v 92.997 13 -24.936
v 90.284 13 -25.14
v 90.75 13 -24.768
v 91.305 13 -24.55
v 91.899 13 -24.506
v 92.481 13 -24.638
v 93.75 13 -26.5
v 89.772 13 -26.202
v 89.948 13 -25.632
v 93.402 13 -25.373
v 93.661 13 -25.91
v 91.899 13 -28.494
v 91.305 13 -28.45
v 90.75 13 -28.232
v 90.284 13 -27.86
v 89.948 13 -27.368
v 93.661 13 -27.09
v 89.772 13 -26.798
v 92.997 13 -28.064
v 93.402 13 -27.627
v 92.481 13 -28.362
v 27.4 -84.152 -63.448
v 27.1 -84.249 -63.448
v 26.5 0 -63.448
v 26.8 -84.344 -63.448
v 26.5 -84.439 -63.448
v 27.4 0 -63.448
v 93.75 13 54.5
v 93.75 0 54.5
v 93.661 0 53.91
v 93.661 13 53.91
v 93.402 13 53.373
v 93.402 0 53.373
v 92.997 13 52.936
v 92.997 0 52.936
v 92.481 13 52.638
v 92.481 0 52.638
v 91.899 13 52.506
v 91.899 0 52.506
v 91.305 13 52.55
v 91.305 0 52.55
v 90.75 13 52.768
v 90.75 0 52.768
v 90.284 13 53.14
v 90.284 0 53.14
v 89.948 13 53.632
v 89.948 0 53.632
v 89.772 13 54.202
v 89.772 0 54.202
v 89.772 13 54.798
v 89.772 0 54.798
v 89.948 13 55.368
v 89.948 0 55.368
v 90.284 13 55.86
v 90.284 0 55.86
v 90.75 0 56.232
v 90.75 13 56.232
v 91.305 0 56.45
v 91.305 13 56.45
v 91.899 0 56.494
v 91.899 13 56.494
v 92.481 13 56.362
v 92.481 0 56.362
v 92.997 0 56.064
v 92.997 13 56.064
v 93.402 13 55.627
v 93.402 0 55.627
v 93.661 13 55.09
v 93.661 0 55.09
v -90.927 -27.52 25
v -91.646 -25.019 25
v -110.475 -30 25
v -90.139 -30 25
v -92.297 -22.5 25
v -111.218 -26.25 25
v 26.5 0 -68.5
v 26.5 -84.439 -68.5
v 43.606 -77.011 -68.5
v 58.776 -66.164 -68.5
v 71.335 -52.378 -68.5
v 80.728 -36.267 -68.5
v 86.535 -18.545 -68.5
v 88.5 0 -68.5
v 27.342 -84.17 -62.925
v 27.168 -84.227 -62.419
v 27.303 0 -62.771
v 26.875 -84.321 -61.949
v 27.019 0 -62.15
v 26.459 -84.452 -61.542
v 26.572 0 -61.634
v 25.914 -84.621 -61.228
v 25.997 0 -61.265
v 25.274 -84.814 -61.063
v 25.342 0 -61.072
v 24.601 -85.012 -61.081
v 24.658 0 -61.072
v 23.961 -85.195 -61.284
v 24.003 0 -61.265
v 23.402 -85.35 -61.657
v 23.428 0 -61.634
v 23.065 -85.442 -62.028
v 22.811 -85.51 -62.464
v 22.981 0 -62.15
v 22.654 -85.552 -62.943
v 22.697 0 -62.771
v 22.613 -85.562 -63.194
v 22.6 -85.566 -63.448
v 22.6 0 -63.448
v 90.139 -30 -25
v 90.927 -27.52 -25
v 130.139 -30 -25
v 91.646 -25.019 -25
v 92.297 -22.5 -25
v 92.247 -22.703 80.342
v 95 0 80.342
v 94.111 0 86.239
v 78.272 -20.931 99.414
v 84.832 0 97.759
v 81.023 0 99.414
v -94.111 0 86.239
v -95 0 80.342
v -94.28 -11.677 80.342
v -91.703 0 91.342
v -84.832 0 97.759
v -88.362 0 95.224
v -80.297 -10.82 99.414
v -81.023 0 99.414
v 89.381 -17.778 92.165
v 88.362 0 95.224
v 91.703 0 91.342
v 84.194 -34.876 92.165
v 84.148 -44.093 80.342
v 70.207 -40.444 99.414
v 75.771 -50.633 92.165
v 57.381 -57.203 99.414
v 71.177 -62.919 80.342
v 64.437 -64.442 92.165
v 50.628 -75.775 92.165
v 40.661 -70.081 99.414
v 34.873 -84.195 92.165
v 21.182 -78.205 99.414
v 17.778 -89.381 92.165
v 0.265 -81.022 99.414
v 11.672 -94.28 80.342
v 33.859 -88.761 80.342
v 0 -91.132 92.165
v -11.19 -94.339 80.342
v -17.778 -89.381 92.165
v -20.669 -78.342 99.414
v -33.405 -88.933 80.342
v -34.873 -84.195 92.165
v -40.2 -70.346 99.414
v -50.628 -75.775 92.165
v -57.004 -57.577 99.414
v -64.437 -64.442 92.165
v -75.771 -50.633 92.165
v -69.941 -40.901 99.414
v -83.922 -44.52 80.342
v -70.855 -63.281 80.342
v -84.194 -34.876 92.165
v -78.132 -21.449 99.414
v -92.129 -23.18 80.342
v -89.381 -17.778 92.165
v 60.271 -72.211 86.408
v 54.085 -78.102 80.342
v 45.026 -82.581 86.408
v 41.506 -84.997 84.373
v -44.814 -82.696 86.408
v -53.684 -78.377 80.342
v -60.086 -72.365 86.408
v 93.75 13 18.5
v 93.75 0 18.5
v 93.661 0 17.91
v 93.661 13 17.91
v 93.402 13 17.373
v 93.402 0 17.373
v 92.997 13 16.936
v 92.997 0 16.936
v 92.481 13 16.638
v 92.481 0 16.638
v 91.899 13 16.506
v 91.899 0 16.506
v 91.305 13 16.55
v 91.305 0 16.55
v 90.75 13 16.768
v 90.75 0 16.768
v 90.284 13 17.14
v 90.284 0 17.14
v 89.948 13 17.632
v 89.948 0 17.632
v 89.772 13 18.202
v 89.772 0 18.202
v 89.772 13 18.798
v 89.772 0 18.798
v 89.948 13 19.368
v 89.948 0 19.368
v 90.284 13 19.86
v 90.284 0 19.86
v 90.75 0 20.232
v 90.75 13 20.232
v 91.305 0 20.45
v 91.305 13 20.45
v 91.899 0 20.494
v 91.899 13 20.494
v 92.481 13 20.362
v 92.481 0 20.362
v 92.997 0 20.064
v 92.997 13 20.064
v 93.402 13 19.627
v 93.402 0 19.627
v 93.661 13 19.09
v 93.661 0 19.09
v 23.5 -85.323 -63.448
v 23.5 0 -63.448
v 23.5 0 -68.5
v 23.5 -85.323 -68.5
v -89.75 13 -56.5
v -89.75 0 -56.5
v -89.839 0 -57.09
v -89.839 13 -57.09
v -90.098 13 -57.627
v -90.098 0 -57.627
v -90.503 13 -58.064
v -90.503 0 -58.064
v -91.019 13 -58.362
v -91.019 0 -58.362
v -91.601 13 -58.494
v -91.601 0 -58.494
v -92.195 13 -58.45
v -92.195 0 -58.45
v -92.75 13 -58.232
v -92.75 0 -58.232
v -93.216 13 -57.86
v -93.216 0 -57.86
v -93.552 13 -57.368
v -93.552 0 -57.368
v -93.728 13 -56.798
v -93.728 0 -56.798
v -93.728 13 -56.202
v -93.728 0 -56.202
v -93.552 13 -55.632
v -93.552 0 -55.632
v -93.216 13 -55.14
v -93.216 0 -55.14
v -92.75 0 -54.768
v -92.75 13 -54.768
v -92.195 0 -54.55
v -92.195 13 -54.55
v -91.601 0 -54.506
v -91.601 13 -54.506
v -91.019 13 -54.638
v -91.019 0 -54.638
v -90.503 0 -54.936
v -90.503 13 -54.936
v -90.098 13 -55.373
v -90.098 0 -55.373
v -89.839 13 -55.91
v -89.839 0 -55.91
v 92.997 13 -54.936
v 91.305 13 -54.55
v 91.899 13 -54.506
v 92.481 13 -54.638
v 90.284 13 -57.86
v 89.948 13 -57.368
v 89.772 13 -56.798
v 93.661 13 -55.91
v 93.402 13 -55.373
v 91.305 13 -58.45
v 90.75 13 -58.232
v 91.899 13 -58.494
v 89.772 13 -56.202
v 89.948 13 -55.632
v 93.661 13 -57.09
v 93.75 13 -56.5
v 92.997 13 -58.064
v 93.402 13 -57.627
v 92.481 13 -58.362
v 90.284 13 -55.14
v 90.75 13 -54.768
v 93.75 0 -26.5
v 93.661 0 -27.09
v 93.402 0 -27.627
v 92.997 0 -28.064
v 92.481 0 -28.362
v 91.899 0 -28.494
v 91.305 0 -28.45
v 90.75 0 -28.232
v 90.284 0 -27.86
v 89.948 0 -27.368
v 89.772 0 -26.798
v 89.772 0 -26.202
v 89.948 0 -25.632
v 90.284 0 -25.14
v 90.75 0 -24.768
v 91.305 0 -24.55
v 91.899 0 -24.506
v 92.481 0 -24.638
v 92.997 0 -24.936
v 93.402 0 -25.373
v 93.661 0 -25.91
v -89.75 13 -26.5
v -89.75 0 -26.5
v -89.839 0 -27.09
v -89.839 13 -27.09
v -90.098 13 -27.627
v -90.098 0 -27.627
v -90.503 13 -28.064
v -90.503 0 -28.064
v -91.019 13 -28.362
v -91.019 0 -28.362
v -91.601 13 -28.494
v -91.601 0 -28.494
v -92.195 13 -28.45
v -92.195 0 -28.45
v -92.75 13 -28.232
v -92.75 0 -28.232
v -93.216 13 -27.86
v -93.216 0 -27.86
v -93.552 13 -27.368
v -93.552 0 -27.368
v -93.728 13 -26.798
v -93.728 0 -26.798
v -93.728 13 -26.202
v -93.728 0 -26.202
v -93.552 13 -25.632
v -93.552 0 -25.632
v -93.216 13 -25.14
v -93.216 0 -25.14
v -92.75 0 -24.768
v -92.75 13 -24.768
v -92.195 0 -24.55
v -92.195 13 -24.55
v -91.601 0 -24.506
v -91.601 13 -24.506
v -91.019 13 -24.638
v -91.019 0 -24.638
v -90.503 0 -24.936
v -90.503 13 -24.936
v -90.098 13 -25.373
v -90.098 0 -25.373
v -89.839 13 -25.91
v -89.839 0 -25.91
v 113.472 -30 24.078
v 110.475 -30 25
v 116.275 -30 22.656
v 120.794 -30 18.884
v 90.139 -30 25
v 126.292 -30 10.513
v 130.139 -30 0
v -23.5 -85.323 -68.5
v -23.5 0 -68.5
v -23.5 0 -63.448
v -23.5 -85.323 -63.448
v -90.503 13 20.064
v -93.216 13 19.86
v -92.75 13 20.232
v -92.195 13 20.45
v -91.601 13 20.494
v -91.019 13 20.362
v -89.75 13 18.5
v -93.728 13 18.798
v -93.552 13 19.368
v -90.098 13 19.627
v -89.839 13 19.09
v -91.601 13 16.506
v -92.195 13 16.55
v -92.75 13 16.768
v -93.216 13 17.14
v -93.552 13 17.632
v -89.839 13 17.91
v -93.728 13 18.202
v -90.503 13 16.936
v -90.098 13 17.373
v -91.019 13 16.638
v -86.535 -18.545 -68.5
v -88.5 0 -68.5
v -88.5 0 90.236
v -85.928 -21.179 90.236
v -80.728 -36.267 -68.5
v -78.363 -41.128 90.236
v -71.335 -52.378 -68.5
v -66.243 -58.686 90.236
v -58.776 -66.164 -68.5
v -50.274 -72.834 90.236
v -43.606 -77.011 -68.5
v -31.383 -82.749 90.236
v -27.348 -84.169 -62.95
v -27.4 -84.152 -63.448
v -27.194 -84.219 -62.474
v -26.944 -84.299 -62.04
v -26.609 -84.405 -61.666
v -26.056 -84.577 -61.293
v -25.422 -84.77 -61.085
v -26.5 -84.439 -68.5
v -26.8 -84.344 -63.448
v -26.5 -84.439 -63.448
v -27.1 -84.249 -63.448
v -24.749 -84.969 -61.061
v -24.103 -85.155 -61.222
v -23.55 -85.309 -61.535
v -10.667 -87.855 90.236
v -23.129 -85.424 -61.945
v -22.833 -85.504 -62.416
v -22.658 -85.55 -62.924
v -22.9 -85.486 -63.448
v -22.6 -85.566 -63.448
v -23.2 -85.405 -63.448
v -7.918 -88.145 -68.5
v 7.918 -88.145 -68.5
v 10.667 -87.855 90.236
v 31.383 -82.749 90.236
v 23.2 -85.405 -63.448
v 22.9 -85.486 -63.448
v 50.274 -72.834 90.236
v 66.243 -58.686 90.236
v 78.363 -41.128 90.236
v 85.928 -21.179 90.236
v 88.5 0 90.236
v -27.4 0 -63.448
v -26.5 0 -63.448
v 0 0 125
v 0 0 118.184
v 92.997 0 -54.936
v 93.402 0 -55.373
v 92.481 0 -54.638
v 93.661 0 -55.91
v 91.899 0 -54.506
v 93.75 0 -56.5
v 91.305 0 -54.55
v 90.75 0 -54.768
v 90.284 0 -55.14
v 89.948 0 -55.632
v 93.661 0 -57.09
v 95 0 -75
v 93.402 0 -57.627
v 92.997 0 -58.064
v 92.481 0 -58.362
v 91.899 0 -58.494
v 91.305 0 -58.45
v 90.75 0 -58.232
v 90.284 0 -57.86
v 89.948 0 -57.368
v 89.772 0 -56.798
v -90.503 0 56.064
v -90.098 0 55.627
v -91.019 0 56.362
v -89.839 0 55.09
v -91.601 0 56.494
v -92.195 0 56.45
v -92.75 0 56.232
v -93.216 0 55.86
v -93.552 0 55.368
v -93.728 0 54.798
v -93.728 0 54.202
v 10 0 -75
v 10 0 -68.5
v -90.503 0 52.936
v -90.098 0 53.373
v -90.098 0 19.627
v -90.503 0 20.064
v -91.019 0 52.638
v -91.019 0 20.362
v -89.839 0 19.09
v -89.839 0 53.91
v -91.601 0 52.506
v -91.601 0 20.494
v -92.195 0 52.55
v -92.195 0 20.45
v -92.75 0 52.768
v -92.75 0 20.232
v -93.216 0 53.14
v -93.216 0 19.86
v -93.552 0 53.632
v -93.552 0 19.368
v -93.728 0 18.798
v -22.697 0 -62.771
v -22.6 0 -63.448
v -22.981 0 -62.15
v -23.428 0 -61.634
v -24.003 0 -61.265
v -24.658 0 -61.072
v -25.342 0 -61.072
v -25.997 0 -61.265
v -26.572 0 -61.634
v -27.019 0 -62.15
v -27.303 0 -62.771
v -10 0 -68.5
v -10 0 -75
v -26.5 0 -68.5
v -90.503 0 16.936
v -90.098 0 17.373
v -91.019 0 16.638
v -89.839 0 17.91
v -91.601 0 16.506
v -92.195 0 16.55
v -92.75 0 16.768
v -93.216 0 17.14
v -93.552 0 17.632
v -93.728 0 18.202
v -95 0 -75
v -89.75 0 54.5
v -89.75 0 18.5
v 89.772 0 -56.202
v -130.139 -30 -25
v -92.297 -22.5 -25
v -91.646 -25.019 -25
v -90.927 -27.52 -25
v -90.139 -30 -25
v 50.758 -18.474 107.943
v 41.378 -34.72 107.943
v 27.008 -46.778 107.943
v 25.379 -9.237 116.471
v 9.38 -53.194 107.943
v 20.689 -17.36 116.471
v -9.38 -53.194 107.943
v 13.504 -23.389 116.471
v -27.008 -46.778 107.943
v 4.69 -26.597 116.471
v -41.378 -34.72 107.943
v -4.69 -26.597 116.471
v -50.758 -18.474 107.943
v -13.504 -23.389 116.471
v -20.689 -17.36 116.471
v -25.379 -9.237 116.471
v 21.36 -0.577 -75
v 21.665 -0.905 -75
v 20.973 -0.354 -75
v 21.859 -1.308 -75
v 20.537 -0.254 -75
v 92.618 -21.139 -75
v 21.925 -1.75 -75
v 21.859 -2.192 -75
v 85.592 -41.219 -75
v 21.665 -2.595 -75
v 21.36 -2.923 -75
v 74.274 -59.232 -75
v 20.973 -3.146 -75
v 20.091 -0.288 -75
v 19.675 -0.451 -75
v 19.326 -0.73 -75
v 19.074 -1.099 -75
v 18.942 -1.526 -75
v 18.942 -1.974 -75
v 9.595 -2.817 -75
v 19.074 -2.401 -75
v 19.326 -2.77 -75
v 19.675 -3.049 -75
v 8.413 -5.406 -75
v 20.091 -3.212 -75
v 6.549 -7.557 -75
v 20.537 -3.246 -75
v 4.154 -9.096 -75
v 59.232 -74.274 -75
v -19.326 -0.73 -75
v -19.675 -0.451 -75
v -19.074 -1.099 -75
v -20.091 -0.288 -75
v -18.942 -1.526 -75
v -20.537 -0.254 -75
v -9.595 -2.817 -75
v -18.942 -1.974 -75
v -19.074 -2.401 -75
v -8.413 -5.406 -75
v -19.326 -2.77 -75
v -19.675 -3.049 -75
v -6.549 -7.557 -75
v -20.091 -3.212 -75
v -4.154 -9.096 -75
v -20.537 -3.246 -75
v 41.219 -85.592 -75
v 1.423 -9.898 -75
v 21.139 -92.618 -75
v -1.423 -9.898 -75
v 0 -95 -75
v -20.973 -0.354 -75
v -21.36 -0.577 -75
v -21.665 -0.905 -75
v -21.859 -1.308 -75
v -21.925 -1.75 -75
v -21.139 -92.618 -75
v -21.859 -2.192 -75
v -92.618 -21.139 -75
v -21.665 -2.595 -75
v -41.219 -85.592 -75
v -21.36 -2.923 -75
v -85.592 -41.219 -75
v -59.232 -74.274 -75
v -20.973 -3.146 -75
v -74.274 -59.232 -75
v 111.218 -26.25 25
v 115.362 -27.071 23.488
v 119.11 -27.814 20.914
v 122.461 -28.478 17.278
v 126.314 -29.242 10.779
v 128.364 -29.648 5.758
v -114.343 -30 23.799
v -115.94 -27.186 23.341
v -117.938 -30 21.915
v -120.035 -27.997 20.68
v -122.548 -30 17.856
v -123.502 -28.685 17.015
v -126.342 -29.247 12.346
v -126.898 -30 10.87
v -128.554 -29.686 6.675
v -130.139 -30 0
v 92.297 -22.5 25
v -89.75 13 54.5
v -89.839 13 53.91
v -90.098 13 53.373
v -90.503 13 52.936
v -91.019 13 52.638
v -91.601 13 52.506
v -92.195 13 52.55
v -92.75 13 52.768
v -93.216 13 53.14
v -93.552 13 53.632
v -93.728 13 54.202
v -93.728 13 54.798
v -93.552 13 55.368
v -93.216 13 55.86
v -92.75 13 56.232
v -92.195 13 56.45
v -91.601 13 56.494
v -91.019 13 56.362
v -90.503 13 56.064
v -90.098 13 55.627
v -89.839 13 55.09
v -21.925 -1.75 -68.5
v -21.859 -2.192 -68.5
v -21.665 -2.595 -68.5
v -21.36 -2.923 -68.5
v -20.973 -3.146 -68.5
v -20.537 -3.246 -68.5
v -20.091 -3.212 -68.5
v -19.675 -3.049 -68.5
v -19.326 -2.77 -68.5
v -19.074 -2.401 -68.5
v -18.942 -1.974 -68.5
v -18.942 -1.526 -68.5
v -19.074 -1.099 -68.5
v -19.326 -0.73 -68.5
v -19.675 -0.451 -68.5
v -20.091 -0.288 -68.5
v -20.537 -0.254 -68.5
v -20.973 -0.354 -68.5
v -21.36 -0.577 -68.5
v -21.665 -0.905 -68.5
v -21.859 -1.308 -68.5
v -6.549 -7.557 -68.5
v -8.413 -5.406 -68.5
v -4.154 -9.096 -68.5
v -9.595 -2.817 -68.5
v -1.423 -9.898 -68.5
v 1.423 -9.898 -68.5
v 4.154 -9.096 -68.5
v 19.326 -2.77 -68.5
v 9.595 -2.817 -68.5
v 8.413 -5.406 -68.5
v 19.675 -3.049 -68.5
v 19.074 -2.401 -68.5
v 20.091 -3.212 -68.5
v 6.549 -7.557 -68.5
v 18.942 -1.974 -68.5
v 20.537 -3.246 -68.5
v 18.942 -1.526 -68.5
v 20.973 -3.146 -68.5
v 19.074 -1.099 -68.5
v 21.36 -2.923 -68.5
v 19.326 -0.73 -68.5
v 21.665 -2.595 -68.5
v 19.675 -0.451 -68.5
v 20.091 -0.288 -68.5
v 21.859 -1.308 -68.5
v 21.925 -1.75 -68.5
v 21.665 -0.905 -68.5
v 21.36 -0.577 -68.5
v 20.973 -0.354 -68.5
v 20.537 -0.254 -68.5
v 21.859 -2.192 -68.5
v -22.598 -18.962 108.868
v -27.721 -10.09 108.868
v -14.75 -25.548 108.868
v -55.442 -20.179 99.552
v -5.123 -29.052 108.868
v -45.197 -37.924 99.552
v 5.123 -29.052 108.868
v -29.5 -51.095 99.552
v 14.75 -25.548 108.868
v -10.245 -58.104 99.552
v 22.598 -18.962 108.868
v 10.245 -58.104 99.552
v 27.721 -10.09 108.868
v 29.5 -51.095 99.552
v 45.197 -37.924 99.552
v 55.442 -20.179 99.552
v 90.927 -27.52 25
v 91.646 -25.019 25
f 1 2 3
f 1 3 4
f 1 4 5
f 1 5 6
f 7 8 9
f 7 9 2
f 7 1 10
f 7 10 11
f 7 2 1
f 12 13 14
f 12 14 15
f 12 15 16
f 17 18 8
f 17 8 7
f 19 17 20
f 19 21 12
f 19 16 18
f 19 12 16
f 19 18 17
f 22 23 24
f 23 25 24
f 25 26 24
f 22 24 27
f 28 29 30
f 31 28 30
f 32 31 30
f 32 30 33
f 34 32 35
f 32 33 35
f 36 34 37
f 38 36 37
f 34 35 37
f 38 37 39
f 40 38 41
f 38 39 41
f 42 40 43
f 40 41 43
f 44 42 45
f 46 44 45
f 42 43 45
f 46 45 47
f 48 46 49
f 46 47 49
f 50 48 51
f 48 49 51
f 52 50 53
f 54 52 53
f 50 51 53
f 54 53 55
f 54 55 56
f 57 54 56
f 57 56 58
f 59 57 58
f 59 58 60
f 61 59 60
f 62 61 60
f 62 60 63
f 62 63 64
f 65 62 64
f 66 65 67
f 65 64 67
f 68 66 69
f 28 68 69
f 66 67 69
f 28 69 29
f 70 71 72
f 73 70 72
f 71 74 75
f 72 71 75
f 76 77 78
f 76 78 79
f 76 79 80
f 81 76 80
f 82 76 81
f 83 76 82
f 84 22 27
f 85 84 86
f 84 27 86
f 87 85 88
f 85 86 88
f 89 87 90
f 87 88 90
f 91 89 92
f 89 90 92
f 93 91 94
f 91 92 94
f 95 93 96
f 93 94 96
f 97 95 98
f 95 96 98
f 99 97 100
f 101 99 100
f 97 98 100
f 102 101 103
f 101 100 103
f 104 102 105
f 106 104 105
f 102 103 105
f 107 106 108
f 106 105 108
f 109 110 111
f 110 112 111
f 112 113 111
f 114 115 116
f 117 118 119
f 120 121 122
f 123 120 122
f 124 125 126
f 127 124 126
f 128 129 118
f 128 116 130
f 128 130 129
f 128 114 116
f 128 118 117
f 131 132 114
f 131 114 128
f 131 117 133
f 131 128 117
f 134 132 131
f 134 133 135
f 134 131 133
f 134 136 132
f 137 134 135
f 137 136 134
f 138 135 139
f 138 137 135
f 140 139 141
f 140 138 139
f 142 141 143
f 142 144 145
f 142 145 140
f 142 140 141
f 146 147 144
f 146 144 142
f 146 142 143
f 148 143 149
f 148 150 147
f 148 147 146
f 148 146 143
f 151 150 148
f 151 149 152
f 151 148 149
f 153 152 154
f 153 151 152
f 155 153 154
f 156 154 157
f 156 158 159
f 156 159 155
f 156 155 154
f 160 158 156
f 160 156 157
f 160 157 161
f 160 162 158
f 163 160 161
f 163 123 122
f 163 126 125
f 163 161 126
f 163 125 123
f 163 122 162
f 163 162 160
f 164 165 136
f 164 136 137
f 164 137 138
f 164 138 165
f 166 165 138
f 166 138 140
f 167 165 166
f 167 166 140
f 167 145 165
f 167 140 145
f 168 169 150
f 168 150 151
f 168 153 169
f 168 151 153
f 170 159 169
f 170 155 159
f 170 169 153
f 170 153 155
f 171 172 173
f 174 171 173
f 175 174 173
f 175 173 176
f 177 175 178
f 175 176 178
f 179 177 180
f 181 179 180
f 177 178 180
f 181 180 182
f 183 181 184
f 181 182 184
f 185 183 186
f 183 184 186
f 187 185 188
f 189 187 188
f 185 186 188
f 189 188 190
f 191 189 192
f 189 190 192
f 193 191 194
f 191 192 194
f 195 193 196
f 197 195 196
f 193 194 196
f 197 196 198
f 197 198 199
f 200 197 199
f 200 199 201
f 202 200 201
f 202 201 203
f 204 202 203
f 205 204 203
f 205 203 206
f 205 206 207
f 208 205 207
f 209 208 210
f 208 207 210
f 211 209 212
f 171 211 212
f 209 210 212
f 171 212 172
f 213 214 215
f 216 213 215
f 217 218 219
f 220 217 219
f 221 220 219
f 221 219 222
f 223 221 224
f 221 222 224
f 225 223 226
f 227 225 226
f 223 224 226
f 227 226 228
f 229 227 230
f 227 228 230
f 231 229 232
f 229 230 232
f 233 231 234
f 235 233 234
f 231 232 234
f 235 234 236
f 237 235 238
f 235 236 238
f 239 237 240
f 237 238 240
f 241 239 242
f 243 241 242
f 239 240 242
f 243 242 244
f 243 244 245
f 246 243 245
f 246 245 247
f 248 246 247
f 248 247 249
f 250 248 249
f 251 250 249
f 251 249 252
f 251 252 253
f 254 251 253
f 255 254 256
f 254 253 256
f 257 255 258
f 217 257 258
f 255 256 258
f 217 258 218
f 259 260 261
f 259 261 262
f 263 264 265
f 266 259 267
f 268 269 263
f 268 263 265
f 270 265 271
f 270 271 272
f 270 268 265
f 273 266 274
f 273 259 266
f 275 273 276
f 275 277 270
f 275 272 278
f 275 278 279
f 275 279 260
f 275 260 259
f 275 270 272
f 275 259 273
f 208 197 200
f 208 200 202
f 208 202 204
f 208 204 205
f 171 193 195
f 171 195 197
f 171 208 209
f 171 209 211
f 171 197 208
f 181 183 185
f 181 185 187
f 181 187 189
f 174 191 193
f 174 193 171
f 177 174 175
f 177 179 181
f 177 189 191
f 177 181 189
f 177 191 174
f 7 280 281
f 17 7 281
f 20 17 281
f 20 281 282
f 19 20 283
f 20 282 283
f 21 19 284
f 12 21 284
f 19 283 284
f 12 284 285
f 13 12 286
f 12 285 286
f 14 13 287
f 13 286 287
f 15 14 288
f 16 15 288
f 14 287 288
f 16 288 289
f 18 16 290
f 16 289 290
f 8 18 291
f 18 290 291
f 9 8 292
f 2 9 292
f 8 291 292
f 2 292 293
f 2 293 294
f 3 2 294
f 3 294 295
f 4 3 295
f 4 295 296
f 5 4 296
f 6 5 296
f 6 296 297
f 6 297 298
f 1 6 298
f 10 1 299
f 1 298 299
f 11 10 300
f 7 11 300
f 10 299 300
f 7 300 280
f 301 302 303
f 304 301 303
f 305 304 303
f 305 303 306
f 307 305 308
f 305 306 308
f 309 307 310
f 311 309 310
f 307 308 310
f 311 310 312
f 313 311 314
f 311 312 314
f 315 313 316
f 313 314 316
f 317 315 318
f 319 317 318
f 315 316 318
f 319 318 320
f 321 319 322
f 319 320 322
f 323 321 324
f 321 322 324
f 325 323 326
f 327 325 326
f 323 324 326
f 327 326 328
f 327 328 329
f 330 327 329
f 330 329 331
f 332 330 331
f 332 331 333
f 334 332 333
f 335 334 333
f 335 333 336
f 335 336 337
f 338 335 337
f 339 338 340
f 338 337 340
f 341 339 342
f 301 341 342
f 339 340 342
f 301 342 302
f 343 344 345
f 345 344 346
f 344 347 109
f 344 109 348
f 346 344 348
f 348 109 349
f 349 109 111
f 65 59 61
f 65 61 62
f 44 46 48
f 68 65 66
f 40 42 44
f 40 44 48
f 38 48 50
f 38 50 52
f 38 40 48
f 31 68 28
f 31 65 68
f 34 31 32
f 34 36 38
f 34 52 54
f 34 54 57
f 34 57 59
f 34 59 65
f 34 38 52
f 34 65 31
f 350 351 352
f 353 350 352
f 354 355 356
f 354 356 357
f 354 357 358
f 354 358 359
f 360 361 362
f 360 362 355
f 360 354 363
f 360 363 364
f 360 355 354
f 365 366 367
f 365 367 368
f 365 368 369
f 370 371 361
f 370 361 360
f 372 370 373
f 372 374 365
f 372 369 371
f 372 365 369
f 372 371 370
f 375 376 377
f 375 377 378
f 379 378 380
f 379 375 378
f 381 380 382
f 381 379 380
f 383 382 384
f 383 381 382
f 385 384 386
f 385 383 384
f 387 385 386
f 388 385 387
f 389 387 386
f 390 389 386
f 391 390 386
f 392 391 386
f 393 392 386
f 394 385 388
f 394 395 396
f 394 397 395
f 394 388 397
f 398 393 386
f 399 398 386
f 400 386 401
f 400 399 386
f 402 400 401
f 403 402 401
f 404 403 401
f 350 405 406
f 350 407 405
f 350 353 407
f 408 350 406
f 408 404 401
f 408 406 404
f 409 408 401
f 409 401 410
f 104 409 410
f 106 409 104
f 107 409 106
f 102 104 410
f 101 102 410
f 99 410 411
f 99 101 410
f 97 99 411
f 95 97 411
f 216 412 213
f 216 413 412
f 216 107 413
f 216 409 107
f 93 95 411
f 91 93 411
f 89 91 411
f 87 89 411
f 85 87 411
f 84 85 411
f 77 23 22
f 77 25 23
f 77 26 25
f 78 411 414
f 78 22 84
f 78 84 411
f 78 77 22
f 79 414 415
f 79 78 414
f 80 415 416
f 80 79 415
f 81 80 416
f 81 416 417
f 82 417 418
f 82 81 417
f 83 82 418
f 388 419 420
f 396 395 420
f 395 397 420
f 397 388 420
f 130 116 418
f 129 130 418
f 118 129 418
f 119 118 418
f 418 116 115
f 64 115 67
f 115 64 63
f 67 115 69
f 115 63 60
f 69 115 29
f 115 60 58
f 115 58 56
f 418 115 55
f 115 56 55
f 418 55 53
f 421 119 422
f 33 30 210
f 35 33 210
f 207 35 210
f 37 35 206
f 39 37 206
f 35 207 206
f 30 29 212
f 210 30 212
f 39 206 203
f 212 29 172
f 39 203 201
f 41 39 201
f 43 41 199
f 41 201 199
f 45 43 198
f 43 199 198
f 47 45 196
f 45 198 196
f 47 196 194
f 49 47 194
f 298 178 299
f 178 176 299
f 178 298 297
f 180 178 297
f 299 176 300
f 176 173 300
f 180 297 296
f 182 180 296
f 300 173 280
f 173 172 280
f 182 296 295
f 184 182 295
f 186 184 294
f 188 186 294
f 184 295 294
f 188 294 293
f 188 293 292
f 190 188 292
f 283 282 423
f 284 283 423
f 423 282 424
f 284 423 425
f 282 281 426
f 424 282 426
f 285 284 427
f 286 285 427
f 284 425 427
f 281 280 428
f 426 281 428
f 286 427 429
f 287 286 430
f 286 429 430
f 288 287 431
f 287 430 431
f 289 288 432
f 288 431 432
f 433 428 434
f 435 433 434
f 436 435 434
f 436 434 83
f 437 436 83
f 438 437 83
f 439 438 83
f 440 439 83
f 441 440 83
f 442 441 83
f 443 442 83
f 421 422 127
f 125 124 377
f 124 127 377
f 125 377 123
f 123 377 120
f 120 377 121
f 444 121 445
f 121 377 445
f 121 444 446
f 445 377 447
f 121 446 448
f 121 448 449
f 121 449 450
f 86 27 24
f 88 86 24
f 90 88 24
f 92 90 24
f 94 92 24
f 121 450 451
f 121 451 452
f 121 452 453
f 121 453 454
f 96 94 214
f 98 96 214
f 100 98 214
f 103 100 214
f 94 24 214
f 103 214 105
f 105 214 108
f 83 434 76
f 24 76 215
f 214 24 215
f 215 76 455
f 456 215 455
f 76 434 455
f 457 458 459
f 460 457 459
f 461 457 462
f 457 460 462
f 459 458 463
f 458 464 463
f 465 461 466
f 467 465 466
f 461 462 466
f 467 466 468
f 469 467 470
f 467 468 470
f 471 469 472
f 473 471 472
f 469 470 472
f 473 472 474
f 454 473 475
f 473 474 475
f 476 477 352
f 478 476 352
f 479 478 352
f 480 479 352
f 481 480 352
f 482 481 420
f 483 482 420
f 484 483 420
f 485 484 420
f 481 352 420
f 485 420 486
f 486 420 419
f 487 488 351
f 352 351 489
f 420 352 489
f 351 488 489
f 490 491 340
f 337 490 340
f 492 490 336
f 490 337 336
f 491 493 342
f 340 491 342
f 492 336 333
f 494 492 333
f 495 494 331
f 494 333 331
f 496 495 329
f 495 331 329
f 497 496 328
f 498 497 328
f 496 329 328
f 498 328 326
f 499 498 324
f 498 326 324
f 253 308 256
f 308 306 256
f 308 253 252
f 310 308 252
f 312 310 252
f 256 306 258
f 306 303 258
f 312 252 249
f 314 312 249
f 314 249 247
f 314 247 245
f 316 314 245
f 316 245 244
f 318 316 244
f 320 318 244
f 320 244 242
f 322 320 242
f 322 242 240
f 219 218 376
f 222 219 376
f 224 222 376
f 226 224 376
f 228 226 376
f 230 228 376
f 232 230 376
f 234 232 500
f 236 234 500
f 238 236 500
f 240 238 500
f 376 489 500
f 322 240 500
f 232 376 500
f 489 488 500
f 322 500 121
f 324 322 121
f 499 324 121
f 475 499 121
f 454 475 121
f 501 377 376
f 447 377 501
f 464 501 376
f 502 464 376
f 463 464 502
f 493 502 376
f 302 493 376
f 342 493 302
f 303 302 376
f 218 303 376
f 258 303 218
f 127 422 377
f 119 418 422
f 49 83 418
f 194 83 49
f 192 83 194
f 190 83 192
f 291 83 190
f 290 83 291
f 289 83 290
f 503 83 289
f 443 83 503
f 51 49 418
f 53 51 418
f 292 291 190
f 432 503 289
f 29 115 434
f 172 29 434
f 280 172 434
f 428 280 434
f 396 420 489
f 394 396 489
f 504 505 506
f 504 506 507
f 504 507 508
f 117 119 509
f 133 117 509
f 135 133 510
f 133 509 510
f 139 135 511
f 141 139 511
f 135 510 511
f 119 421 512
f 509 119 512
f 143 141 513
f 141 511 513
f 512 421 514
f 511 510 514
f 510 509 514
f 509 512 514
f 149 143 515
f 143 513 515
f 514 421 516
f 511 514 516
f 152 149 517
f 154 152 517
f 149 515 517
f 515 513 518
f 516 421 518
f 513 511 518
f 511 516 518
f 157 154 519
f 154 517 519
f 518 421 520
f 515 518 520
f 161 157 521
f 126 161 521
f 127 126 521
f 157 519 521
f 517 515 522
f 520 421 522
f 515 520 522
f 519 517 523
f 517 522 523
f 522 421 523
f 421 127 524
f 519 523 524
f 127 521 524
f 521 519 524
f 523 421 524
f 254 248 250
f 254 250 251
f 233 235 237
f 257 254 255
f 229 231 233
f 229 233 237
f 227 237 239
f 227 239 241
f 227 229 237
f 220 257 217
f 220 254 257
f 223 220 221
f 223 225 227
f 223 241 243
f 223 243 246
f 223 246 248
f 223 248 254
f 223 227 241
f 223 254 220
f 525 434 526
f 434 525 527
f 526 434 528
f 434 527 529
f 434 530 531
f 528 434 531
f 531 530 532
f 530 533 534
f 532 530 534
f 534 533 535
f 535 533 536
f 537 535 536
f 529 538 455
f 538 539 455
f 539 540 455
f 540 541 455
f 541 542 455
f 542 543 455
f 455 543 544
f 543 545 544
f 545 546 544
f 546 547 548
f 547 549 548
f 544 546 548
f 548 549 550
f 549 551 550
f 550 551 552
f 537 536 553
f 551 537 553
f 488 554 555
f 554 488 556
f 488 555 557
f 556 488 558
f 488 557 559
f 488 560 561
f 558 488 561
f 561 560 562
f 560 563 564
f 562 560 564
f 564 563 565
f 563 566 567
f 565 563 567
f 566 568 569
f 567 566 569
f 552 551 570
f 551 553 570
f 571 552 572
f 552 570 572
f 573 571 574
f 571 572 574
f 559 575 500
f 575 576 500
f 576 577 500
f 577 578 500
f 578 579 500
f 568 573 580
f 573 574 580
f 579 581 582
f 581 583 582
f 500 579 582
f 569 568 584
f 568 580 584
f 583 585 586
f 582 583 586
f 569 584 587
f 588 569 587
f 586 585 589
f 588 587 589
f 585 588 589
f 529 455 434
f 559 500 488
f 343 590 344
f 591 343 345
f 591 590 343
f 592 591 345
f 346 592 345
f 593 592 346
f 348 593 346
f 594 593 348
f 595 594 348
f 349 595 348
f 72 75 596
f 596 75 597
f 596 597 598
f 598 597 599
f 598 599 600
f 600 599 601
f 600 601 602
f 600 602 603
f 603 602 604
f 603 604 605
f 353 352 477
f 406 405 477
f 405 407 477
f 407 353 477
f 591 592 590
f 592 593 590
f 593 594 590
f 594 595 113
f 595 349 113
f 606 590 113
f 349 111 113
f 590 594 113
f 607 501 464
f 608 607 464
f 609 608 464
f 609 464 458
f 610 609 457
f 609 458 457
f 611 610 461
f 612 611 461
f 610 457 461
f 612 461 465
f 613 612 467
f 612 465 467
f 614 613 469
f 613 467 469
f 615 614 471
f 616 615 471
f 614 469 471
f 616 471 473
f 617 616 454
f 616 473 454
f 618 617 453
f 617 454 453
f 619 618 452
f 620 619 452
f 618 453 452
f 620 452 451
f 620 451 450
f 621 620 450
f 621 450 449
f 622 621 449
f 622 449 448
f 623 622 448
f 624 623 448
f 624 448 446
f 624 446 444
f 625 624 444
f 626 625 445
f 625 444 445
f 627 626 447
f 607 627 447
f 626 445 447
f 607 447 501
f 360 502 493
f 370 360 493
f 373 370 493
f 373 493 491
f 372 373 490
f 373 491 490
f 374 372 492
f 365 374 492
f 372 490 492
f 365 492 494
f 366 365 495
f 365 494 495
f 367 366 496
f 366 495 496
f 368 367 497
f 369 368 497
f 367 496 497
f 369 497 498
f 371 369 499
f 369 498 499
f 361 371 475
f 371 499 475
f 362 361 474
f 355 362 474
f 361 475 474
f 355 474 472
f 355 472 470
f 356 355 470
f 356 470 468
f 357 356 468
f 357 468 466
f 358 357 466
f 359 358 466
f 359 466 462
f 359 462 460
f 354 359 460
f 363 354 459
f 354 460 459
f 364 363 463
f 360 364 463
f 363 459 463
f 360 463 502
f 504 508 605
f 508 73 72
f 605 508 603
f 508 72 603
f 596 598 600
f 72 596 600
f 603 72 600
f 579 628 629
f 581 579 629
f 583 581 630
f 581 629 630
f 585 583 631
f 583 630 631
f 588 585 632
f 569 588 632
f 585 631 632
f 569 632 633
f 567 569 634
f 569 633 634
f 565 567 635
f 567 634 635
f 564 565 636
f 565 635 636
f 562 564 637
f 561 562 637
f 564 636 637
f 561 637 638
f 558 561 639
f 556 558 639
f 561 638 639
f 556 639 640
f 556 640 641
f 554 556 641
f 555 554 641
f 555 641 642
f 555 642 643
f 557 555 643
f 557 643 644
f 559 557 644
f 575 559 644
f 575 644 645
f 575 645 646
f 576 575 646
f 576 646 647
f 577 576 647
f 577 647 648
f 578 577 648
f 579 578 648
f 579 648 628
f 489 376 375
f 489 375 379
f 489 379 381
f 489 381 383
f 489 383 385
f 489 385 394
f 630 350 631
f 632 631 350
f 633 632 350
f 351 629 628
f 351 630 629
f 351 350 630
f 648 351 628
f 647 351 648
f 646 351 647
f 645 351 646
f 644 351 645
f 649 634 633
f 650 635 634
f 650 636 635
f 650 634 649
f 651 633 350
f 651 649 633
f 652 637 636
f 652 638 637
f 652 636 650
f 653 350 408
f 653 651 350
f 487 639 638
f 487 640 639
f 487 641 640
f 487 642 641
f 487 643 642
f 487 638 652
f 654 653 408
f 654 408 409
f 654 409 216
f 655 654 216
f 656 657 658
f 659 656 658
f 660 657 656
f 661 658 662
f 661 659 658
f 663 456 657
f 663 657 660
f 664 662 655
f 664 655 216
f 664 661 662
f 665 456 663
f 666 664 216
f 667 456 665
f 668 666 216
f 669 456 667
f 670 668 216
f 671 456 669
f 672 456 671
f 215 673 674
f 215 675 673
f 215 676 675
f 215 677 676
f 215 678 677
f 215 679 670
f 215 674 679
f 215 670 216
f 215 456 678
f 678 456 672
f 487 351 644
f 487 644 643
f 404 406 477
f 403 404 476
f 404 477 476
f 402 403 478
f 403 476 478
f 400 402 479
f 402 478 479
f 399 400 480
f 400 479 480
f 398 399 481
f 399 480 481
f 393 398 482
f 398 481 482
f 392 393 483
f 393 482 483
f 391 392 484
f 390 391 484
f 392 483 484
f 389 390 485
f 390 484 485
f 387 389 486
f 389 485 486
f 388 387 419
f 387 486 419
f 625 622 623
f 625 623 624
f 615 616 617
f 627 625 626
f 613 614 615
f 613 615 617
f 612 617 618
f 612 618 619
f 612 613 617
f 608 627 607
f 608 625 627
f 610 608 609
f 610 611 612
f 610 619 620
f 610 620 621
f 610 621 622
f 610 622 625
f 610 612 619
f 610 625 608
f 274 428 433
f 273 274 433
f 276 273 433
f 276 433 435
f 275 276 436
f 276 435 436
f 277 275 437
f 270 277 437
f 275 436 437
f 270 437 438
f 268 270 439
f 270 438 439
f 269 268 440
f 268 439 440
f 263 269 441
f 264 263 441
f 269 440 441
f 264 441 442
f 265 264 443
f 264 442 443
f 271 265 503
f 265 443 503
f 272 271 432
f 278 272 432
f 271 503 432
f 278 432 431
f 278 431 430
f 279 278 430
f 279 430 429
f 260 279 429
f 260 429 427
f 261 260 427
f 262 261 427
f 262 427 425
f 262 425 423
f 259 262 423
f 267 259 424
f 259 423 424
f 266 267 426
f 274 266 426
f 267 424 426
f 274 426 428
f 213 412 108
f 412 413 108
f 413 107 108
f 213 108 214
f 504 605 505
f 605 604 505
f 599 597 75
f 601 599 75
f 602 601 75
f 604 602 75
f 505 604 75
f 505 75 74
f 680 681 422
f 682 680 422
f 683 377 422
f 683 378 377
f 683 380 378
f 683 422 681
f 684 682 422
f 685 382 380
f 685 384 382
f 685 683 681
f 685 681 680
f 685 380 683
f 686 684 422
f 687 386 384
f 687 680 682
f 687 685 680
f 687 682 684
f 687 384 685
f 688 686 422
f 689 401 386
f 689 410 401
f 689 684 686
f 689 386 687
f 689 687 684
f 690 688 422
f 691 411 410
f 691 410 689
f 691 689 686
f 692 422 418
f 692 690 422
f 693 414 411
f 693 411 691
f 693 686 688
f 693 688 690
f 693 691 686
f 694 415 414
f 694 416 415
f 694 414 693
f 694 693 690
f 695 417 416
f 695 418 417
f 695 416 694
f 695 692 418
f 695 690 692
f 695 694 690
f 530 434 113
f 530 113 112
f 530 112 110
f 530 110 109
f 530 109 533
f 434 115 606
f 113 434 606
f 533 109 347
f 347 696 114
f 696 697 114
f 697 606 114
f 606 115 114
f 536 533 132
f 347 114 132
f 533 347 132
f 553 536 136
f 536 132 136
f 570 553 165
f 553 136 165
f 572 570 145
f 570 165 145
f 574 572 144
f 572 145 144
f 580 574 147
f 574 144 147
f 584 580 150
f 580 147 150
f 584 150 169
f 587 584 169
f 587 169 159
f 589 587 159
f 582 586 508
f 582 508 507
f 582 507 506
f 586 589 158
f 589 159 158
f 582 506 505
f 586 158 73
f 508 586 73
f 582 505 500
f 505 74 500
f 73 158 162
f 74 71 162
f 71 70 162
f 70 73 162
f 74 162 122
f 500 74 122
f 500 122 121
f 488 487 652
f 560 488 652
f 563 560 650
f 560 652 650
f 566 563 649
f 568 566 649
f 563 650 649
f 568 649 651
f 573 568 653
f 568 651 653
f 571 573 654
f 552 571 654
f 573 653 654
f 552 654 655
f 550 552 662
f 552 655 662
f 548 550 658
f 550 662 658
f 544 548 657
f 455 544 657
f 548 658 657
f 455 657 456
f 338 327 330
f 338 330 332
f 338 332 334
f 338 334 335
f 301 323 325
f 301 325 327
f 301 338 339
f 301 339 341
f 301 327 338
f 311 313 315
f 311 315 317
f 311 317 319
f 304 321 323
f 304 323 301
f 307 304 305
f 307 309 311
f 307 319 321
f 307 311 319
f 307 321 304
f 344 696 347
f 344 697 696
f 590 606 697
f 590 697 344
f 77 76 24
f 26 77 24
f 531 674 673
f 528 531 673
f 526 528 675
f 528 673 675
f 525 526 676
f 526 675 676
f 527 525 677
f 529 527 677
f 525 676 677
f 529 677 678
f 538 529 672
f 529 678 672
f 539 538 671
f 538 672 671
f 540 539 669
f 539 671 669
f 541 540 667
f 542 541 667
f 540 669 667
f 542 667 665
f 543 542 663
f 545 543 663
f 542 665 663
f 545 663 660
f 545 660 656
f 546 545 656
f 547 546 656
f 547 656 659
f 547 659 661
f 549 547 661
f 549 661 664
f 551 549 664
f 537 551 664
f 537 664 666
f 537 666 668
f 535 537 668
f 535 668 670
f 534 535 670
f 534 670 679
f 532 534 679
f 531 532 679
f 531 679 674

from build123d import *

# Parameters (mm, degrees)
REVOLVE1_ANGLE           = 180
SKETCH3_R                = 2
BOSS_EXTRUDE1_DEPTH      = 13
BOSS_EXTRUDE8_REACH      = 185.507
BOSS_EXTRUDE8_END_RADIUS = 88.5
SKETCH7_R                = 10
SKETCH7_R_2              = 1.5
CUT_EXTRUDE1_DEPTH       = 10
BOSS_EXTRUDE11_DEPTH     = 25
FILLET1_R                = 20
CUT_EXTRUDE2_DEPTH       = 10
CUT_EXTRUDE3_DEPTH       = 10


with BuildPart() as part:
    # Sketch1 → Revolve1 (revolve)
    with BuildSketch(Plane(origin=(0, 0, 0), x_dir=(1, 0, 0), z_dir=(0, 1, 0))):
        Polygon((0, 75), (95, 75), (95, -95), (0, -125), align=None)
    revolve(axis=Axis((0, 0, 125), (0, 0, -1)), revolution_arc=REVOLVE1_ANGLE)

    # Sketch2 → Cut-Revolve3 (revolve, cut)
    with BuildSketch(Plane(origin=(0, 0, 0), x_dir=(1, 0, 0), z_dir=(0, 1, 0))):
        Polygon((0, 68.5), (0, -118.183600921), (88.5, -90.2362325), (88.5, 68.5), align=None)
    revolve(axis=Axis((0, 0, -68.5), (0, 0, 1)), mode=Mode.SUBTRACT)

    # Sketch3 → Boss-Extrude1 (add)
    with BuildSketch(Plane(origin=(0, 0, 0), x_dir=(1, 0, 0), z_dir=(0, 1, 0))):
        with Locations((-91.75, 56.5)):
            Circle(SKETCH3_R)
        with Locations((-91.75, 26.5)):
            Circle(SKETCH3_R)
        with Locations((-91.75, -18.5)):
            Circle(SKETCH3_R)
        with Locations((-91.75, -54.5)):
            Circle(SKETCH3_R)
        with Locations((91.75, -54.5)):
            Circle(SKETCH3_R)
        with Locations((91.75, -18.5)):
            Circle(SKETCH3_R)
        with Locations((91.75, 26.5)):
            Circle(SKETCH3_R)
        with Locations((91.75, 56.5)):
            Circle(SKETCH3_R)
    extrude(amount=BOSS_EXTRUDE1_DEPTH)

    # Boss-Extrude8: up to this cylinder (the profile starts inside it)
    boss_extrude8_end = Plane(origin=(0, 0, -64.648778), z_dir=(0, 0, -1)) * Cylinder(BOSS_EXTRUDE8_END_RADIUS, 549.014, mode=Mode.PRIVATE)
    # Sketch5 → Boss-Extrude8 (add, up to the surface)
    with BuildSketch(Plane(origin=(0, 0, 0), x_dir=(1, 0, 0), z_dir=(0, 1, 0)), mode=Mode.PRIVATE) as boss_extrude8_sk1:
        with BuildLine():
            Line((23.5, 63.447630747), (23.5, 68.5))
            Line((23.5, 68.5), (26.5, 68.5))
            Line((26.5, 68.5), (26.5, 63.447630747))
            Line((26.5, 63.447630747), (27.4, 63.447630747))
            ThreePointArc((27.4, 63.447630747), (25, 61.047630747), (22.6, 63.447630747))
            Line((22.6, 63.447630747), (23.5, 63.447630747))
        make_face()
    boss_extrude8_tool1 = extrude(boss_extrude8_sk1.sketch, amount=-BOSS_EXTRUDE8_REACH, mode=Mode.PRIVATE) & boss_extrude8_end
    add(boss_extrude8_tool1.solids().sort_by_distance((25, 0, -64.648778))[0])
    # Sketch5 → Boss-Extrude8 (add, up to the surface)
    with BuildSketch(Plane(origin=(0, 0, 0), x_dir=(1, 0, 0), z_dir=(0, 1, 0)), mode=Mode.PRIVATE) as boss_extrude8_sk2:
        with BuildLine():
            Line((-27.4, 63.447630747), (-26.5, 63.447630747))
            Line((-26.5, 63.447630747), (-26.5, 68.5))
            Line((-26.5, 68.5), (-23.5, 68.5))
            Line((-23.5, 68.5), (-23.5, 63.447630747))
            Line((-23.5, 63.447630747), (-22.6, 63.447630747))
            ThreePointArc((-22.6, 63.447630747), (-25, 61.047630747), (-27.4, 63.447630747))
        make_face()
    boss_extrude8_tool2 = extrude(boss_extrude8_sk2.sketch, amount=-BOSS_EXTRUDE8_REACH, mode=Mode.PRIVATE) & boss_extrude8_end
    add(boss_extrude8_tool2.solids().sort_by_distance((-25, 0, -64.648778))[0])

    # Sketch7 → Cut-Extrude1 (cut)
    with BuildSketch(Plane.XY.offset(-68.5)):
        Circle(SKETCH7_R)
        with Locations((20.425168298, -1.75)):
            Circle(SKETCH7_R_2)
        with Locations(Location((-20.425168298, -1.75, 0), (0, 0, 180))):
            Circle(SKETCH7_R_2)
    extrude(amount=-CUT_EXTRUDE1_DEPTH, mode=Mode.SUBTRACT)

    # Sketch8 → Boss-Extrude11 (add, symmetric)
    with BuildSketch(Plane.XY):
        Polygon((90.138781887, -30), (130.138781887, -30), (92.29707471, -22.5), align=None)
        Polygon((-130.138781887, -30), (-92.29707471, -22.5), (-90.138781887, -30), align=None)
    extrude(amount=BOSS_EXTRUDE11_DEPTH, both=True)

    # Fillet1
    fillet1_edges = [part.edges().sort_by_distance(p)[0] for p in [
        (0, -95, 95),
    ]]
    fillet(fillet1_edges, radius=FILLET1_R)

    # Sketch9 → Cut-Extrude2 (cut)
    with BuildSketch(Plane(origin=(-0.802339529, -4.048253002, 0), x_dir=(0.9809198737827295, -0.19441245129382567, 0), z_dir=(0.19441245129382567, 0.9809198737827295, 0))):
        with BuildLine():
            Line((114.199203035, -25), (133.488091041, -25))
            Line((133.488091041, -25), (133.488091041, 0))
            add(Edge.make_bspline(
                [(114.199203035, -25), (127.479134843, -22.055909998), (133.488091041, 0)],
                knots=[0, 0, 0, 1, 1, 1], degree=2))
        make_face()
    extrude(amount=-CUT_EXTRUDE2_DEPTH, mode=Mode.SUBTRACT)

    # Sketch10 → Cut-Extrude3 (cut)
    with BuildSketch(Plane(origin=(0.802339529, -4.048253002, 0), x_dir=(0.9809198737827294, 0.1944124512938259, 0), z_dir=(-0.1944124512938259, 0.9809198737827294, 0))):
        with BuildLine():
            Line((-114.199203035, -25), (-133.488091041, -25))
            Line((-133.488091041, -25), (-133.488091041, 0))
            add(Edge.make_bspline(
                [(-114.199203035, -25), (-129.601076996, -21.529037797), (-133.488091041, 0)],
                knots=[0, 0, 0, 1, 1, 1], degree=2))
        make_face()
    extrude(amount=-CUT_EXTRUDE3_DEPTH, mode=Mode.SUBTRACT)


solid = part.part
